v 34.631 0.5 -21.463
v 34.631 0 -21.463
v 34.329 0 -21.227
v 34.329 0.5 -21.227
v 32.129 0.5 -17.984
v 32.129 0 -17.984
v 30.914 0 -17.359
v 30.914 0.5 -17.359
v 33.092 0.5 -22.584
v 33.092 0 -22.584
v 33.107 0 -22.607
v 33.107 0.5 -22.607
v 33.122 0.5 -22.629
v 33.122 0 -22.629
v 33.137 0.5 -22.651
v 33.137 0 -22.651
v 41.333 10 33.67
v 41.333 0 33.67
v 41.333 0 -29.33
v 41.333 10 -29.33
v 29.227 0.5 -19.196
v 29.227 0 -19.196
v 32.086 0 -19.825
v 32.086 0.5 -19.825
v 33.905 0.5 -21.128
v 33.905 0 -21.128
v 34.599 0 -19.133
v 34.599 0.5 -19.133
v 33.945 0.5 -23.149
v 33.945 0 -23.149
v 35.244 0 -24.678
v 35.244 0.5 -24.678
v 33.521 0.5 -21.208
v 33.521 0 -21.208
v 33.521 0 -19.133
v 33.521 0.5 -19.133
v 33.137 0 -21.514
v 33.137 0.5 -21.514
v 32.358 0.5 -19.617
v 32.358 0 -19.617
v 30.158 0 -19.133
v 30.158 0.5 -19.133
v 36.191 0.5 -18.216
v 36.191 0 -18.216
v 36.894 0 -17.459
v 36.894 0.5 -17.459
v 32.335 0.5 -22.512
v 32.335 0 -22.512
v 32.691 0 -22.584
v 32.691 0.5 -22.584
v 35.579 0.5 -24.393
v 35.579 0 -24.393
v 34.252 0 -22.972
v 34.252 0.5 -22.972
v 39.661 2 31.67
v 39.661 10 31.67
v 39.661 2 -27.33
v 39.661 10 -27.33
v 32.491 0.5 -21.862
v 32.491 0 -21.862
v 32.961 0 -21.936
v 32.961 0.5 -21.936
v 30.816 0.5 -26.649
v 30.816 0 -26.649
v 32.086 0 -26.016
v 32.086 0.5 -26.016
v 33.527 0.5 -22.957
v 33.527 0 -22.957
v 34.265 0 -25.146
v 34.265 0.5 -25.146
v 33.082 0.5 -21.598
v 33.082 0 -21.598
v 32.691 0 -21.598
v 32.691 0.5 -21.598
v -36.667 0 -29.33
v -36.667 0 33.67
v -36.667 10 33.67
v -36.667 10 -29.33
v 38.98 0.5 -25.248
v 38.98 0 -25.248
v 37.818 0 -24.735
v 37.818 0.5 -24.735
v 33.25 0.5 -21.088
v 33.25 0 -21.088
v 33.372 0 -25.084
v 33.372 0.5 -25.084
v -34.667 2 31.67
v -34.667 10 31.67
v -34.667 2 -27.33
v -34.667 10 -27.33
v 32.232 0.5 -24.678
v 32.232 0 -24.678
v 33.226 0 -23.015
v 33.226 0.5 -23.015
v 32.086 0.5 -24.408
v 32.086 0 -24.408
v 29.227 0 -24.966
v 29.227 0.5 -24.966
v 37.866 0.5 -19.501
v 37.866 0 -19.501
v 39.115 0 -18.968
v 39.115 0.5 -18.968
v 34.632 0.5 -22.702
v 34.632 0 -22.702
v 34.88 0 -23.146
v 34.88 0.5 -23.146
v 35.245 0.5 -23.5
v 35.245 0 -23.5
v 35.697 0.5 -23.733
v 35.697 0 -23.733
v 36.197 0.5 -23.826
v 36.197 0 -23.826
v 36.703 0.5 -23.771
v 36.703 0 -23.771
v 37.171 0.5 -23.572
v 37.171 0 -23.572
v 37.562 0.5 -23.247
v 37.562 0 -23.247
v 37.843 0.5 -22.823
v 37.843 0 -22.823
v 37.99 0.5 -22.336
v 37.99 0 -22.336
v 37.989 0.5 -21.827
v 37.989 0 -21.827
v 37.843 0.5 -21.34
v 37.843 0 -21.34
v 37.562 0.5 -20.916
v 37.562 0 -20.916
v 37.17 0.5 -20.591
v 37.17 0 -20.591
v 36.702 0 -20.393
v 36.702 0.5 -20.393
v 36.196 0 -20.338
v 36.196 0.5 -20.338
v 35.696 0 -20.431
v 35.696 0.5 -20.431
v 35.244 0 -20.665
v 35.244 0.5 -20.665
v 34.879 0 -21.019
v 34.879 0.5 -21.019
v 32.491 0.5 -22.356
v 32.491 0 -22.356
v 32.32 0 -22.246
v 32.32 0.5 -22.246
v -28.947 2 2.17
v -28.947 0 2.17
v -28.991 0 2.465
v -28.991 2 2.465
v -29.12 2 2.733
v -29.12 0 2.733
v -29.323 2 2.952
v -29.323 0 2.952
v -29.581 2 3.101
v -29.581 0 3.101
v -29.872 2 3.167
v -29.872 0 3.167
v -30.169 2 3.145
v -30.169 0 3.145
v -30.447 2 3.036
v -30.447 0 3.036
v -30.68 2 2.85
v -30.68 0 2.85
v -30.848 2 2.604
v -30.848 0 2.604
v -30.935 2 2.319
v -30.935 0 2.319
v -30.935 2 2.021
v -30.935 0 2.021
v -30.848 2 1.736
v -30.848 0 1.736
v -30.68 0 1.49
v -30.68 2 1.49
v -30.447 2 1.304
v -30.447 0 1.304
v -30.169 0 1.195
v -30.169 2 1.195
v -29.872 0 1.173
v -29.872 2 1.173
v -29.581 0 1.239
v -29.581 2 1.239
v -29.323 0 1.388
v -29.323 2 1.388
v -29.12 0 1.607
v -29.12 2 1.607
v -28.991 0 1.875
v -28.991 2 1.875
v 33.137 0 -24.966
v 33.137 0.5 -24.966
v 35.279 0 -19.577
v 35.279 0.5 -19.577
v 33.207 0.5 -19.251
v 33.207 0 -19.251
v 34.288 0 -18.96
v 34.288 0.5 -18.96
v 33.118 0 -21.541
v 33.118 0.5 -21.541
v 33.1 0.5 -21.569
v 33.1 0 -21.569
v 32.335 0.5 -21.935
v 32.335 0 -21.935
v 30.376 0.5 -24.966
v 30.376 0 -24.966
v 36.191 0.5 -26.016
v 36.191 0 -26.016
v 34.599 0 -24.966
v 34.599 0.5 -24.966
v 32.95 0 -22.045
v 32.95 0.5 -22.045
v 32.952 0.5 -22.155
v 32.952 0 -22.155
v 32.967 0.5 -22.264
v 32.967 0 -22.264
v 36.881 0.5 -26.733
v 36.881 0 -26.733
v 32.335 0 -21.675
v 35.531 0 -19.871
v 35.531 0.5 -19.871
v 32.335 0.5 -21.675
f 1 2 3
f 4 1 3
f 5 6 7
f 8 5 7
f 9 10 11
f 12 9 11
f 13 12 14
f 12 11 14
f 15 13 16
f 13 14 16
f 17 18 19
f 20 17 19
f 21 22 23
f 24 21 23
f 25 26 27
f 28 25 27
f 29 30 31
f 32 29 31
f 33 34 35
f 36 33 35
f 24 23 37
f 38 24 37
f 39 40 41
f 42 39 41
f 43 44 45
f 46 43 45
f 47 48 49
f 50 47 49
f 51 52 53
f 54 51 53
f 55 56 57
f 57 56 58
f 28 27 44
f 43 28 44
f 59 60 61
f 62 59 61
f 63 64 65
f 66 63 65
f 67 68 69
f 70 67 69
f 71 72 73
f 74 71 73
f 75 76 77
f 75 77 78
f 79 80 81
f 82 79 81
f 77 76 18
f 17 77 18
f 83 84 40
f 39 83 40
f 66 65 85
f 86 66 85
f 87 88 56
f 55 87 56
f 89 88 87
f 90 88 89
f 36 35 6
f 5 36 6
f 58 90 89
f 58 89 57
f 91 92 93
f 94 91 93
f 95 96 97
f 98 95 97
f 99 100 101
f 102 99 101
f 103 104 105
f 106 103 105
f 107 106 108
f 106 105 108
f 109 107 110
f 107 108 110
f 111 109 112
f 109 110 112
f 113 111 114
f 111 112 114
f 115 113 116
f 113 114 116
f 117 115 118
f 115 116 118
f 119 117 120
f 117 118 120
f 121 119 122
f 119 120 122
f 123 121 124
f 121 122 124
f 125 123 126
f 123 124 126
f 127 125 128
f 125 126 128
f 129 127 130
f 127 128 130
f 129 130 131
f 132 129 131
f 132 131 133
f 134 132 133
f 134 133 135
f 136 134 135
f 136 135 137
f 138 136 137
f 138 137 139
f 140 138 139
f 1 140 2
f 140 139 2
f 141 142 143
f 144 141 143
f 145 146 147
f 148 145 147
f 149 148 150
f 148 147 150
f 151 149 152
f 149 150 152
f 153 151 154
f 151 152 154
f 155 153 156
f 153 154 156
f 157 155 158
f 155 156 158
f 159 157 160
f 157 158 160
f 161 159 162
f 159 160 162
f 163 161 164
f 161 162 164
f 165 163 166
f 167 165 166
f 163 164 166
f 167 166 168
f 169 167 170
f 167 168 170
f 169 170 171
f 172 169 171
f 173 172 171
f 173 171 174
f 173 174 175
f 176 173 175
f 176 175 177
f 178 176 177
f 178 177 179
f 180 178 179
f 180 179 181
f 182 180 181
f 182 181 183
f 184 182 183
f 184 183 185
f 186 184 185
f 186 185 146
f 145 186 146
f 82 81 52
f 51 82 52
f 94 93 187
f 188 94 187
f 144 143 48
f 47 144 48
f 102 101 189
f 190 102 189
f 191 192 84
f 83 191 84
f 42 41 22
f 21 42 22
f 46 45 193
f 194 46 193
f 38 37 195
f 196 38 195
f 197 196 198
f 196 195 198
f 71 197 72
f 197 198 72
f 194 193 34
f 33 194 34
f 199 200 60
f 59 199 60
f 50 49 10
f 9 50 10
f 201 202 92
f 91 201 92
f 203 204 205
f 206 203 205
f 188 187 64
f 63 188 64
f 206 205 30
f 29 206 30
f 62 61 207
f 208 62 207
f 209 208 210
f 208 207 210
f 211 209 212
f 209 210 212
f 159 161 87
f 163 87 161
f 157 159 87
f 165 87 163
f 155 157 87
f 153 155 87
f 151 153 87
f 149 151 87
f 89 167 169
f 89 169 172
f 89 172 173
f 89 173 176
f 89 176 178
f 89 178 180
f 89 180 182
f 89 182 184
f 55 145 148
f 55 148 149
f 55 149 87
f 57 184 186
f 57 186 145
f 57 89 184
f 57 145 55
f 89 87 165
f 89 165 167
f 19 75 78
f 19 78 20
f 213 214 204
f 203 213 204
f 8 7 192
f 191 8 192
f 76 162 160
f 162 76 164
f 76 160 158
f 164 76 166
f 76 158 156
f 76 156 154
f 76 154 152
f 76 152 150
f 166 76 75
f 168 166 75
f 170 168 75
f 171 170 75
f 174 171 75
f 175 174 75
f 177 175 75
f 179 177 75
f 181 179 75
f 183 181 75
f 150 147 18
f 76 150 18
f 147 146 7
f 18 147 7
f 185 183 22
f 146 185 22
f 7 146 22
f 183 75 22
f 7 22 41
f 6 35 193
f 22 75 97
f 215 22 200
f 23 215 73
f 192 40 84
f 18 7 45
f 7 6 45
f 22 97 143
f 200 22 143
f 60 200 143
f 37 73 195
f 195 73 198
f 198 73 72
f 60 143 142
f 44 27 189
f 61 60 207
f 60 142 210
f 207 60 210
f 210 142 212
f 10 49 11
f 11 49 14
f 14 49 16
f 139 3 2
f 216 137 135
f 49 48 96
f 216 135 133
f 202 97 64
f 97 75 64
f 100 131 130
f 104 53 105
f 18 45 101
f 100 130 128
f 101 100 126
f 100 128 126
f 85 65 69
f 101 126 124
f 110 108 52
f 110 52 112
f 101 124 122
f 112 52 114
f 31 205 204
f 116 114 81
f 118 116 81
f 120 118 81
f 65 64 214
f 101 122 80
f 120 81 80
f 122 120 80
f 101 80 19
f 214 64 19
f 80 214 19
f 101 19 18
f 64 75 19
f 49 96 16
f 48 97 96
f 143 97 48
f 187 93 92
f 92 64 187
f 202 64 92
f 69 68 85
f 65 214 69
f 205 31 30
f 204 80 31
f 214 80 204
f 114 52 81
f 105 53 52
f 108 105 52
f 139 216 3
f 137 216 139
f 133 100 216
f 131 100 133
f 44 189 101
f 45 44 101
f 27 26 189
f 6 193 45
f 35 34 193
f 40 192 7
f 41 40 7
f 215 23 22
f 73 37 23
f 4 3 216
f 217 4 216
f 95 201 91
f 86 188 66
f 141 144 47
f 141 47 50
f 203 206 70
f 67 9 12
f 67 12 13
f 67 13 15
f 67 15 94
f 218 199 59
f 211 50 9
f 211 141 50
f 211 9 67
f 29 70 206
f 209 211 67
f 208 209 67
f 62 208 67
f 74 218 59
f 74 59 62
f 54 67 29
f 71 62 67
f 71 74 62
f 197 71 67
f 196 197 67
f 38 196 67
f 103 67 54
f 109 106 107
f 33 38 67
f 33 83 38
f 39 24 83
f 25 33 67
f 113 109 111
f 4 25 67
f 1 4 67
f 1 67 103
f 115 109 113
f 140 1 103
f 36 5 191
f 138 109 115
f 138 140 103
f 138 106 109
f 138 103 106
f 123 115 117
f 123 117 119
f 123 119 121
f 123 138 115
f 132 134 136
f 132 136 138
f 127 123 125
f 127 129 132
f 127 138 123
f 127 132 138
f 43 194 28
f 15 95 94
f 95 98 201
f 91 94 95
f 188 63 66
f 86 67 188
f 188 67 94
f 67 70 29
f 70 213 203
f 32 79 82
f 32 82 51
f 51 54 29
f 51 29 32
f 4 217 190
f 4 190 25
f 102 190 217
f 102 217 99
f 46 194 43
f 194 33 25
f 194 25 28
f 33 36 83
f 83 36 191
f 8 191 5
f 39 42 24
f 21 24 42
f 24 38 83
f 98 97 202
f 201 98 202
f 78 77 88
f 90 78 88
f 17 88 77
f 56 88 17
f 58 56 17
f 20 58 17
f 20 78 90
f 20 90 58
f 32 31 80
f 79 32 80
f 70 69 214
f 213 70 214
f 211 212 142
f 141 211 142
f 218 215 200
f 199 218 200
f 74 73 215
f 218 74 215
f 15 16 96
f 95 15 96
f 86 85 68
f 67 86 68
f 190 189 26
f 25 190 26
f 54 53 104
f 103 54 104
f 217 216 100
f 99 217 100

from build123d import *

# Parameters (mm, degrees)
SKETCH2_W           = 78
SKETCH2_H           = 63
BOSS_EXTRUDE1_DEPTH = 10
SKETCH3_W           = 74.327682065
SKETCH3_H           = 59
CUT_EXTRUDE1_DEPTH  = 8
CUT_EXTRUDE2_DEPTH  = 0.5
SKETCH7_R           = 1
CUT_EXTRUDE4_DEPTH  = 10


with BuildPart() as part:
    # Sketch2 → Boss-Extrude1 (new body)
    with BuildSketch(Plane(origin=(0, 0, 0), x_dir=(1, 0, 0), z_dir=(0, 1, 0))):
        with Locations((2.333333333, -2.169871795)):
            Rectangle(SKETCH2_W, SKETCH2_H)
    extrude(amount=BOSS_EXTRUDE1_DEPTH)

    # Sketch3 → Cut-Extrude1 (cut)
    with BuildSketch(Plane(origin=(0, 10, 0), x_dir=(1, 0, 0), z_dir=(0, 1, 0))):
        with Locations((2.497174366, -2.169871795)):
            Rectangle(SKETCH3_W, SKETCH3_H)
    extrude(amount=-CUT_EXTRUDE1_DEPTH, mode=Mode.SUBTRACT)

    # Sketch6 → Cut-Extrude2 (cut)
    with BuildSketch(Plane.XZ):
        with BuildLine():
            Line((32.690802989, -22.584376441), (33.092200105, -22.584376441))
            ThreePointArc((33.092200105, -22.584376441), (33.114100993, -22.618218468), (33.137410711, -22.651105984))
            Line((33.137410711, -22.651105984), (32.08626128, -24.407558571))
            Line((32.08626128, -24.407558571), (29.226689091, -24.966180766))
            Line((29.226689091, -24.966180766), (30.376407219, -24.966180766))
            Line((30.376407219, -24.966180766), (32.232099133, -24.678141196))
            Line((32.232099133, -24.678141196), (33.226175577, -23.014639973))
            Line((33.226175577, -23.014639973), (33.137410711, -24.966180766))
            Line((33.137410711, -24.966180766), (30.816462944, -26.648982972))
            Line((30.816462944, -26.648982972), (32.08626128, -26.016434732))
            Line((32.08626128, -26.016434732), (33.372391781, -25.083926351))
            Line((33.372391781, -25.083926351), (33.526915315, -22.957480273))
            Line((33.526915315, -22.957480273), (34.264738027, -25.146278223))
            Line((34.264738027, -25.146278223), (36.880788863, -26.733349716))
            Line((36.880788863, -26.733349716), (36.19146957, -26.016434732))
            Line((36.19146957, -26.016434732), (34.598609497, -24.966180766))
            Line((34.598609497, -24.966180766), (33.944592444, -23.148589195))
            Line((33.944592444, -23.148589195), (35.243832983, -24.678141196))
            Line((35.243832983, -24.678141196), (38.980139277, -25.248190523))
            Line((38.980139277, -25.248190523), (37.817752325, -24.735025947))
            Line((37.817752325, -24.735025947), (35.578982945, -24.393456258))
            Line((35.578982945, -24.393456258), (34.251613969, -22.972216889))
            Line((34.251613969, -22.972216889), (34.631588177, -22.701732047))
            ThreePointArc((34.631588177, -22.701732047), (38.008201605, -22.081175269), (34.631149946, -21.463007775))
            Line((34.631149946, -21.463007775), (34.32916984, -21.227330494))
            Line((34.32916984, -21.227330494), (35.531005717, -19.871495744))
            Line((35.531005717, -19.871495744), (37.865688927, -19.500837177))
            Line((37.865688927, -19.500837177), (39.115173896, -18.968080087))
            Line((39.115173896, -18.968080087), (35.279154236, -19.577093569))
            Line((35.279154236, -19.577093569), (33.904618441, -21.127757375))
            Line((33.904618441, -21.127757375), (34.598609497, -19.132922738))
            Line((34.598609497, -19.132922738), (36.19146957, -18.215735483))
            Line((36.19146957, -18.215735483), (36.894373516, -17.458564394))
            Line((36.894373516, -17.458564394), (34.287546919, -18.959605302))
            Line((34.287546919, -18.959605302), (33.521005252, -21.208203232))
            Line((33.521005252, -21.208203232), (33.521005252, -19.132922738))
            Line((33.521005252, -19.132922738), (32.128586258, -17.983657476))
            Line((32.128586258, -17.983657476), (30.914042032, -17.358519989))
            Line((30.914042032, -17.358519989), (33.20673173, -19.250844523))
            Line((33.20673173, -19.250844523), (33.250345457, -21.088483091))
            Line((33.250345457, -21.088483091), (32.358416357, -19.616940759))
            Line((32.358416357, -19.616940759), (30.157760841, -19.132922738))
            Line((30.157760841, -19.132922738), (29.226689091, -19.196288455))
            Line((29.226689091, -19.196288455), (32.08626128, -19.82523036))
            Line((32.08626128, -19.82523036), (33.137410711, -21.514148052))
            ThreePointArc((33.137410711, -21.514148052), (33.108673975, -21.555134418), (33.0821246, -21.597570405))
            Line((33.0821246, -21.597570405), (32.690802989, -21.597570405))
            Line((32.690802989, -21.597570405), (32.334590078, -21.674589412))
            Line((32.334590078, -21.674589412), (32.334590078, -21.93528367))
            Line((32.334590078, -21.93528367), (32.490652027, -21.862323244))
            Line((32.490652027, -21.862323244), (32.961131868, -21.935626601))
            ThreePointArc((32.961131868, -21.935626601), (32.949905472, -22.099923891), (32.967075812, -22.263706708))
            Line((32.967075812, -22.263706708), (32.490652027, -22.355724574))
            Line((32.490652027, -22.355724574), (32.320109644, -22.245819483))
            Line((32.320109644, -22.245819483), (32.334590078, -22.512171121))
            Line((32.334590078, -22.512171121), (32.690802989, -22.584376441))
        make_face()
    extrude(amount=-CUT_EXTRUDE2_DEPTH, mode=Mode.SUBTRACT)

    # Sketch7 → Cut-Extrude4 (cut)
    with BuildSketch(Plane.XZ):
        with Locations((-29.946640044, 2.169871795)):
            Circle(SKETCH7_R)
    extrude(amount=-CUT_EXTRUDE4_DEPTH, mode=Mode.SUBTRACT)


solid = part.part
